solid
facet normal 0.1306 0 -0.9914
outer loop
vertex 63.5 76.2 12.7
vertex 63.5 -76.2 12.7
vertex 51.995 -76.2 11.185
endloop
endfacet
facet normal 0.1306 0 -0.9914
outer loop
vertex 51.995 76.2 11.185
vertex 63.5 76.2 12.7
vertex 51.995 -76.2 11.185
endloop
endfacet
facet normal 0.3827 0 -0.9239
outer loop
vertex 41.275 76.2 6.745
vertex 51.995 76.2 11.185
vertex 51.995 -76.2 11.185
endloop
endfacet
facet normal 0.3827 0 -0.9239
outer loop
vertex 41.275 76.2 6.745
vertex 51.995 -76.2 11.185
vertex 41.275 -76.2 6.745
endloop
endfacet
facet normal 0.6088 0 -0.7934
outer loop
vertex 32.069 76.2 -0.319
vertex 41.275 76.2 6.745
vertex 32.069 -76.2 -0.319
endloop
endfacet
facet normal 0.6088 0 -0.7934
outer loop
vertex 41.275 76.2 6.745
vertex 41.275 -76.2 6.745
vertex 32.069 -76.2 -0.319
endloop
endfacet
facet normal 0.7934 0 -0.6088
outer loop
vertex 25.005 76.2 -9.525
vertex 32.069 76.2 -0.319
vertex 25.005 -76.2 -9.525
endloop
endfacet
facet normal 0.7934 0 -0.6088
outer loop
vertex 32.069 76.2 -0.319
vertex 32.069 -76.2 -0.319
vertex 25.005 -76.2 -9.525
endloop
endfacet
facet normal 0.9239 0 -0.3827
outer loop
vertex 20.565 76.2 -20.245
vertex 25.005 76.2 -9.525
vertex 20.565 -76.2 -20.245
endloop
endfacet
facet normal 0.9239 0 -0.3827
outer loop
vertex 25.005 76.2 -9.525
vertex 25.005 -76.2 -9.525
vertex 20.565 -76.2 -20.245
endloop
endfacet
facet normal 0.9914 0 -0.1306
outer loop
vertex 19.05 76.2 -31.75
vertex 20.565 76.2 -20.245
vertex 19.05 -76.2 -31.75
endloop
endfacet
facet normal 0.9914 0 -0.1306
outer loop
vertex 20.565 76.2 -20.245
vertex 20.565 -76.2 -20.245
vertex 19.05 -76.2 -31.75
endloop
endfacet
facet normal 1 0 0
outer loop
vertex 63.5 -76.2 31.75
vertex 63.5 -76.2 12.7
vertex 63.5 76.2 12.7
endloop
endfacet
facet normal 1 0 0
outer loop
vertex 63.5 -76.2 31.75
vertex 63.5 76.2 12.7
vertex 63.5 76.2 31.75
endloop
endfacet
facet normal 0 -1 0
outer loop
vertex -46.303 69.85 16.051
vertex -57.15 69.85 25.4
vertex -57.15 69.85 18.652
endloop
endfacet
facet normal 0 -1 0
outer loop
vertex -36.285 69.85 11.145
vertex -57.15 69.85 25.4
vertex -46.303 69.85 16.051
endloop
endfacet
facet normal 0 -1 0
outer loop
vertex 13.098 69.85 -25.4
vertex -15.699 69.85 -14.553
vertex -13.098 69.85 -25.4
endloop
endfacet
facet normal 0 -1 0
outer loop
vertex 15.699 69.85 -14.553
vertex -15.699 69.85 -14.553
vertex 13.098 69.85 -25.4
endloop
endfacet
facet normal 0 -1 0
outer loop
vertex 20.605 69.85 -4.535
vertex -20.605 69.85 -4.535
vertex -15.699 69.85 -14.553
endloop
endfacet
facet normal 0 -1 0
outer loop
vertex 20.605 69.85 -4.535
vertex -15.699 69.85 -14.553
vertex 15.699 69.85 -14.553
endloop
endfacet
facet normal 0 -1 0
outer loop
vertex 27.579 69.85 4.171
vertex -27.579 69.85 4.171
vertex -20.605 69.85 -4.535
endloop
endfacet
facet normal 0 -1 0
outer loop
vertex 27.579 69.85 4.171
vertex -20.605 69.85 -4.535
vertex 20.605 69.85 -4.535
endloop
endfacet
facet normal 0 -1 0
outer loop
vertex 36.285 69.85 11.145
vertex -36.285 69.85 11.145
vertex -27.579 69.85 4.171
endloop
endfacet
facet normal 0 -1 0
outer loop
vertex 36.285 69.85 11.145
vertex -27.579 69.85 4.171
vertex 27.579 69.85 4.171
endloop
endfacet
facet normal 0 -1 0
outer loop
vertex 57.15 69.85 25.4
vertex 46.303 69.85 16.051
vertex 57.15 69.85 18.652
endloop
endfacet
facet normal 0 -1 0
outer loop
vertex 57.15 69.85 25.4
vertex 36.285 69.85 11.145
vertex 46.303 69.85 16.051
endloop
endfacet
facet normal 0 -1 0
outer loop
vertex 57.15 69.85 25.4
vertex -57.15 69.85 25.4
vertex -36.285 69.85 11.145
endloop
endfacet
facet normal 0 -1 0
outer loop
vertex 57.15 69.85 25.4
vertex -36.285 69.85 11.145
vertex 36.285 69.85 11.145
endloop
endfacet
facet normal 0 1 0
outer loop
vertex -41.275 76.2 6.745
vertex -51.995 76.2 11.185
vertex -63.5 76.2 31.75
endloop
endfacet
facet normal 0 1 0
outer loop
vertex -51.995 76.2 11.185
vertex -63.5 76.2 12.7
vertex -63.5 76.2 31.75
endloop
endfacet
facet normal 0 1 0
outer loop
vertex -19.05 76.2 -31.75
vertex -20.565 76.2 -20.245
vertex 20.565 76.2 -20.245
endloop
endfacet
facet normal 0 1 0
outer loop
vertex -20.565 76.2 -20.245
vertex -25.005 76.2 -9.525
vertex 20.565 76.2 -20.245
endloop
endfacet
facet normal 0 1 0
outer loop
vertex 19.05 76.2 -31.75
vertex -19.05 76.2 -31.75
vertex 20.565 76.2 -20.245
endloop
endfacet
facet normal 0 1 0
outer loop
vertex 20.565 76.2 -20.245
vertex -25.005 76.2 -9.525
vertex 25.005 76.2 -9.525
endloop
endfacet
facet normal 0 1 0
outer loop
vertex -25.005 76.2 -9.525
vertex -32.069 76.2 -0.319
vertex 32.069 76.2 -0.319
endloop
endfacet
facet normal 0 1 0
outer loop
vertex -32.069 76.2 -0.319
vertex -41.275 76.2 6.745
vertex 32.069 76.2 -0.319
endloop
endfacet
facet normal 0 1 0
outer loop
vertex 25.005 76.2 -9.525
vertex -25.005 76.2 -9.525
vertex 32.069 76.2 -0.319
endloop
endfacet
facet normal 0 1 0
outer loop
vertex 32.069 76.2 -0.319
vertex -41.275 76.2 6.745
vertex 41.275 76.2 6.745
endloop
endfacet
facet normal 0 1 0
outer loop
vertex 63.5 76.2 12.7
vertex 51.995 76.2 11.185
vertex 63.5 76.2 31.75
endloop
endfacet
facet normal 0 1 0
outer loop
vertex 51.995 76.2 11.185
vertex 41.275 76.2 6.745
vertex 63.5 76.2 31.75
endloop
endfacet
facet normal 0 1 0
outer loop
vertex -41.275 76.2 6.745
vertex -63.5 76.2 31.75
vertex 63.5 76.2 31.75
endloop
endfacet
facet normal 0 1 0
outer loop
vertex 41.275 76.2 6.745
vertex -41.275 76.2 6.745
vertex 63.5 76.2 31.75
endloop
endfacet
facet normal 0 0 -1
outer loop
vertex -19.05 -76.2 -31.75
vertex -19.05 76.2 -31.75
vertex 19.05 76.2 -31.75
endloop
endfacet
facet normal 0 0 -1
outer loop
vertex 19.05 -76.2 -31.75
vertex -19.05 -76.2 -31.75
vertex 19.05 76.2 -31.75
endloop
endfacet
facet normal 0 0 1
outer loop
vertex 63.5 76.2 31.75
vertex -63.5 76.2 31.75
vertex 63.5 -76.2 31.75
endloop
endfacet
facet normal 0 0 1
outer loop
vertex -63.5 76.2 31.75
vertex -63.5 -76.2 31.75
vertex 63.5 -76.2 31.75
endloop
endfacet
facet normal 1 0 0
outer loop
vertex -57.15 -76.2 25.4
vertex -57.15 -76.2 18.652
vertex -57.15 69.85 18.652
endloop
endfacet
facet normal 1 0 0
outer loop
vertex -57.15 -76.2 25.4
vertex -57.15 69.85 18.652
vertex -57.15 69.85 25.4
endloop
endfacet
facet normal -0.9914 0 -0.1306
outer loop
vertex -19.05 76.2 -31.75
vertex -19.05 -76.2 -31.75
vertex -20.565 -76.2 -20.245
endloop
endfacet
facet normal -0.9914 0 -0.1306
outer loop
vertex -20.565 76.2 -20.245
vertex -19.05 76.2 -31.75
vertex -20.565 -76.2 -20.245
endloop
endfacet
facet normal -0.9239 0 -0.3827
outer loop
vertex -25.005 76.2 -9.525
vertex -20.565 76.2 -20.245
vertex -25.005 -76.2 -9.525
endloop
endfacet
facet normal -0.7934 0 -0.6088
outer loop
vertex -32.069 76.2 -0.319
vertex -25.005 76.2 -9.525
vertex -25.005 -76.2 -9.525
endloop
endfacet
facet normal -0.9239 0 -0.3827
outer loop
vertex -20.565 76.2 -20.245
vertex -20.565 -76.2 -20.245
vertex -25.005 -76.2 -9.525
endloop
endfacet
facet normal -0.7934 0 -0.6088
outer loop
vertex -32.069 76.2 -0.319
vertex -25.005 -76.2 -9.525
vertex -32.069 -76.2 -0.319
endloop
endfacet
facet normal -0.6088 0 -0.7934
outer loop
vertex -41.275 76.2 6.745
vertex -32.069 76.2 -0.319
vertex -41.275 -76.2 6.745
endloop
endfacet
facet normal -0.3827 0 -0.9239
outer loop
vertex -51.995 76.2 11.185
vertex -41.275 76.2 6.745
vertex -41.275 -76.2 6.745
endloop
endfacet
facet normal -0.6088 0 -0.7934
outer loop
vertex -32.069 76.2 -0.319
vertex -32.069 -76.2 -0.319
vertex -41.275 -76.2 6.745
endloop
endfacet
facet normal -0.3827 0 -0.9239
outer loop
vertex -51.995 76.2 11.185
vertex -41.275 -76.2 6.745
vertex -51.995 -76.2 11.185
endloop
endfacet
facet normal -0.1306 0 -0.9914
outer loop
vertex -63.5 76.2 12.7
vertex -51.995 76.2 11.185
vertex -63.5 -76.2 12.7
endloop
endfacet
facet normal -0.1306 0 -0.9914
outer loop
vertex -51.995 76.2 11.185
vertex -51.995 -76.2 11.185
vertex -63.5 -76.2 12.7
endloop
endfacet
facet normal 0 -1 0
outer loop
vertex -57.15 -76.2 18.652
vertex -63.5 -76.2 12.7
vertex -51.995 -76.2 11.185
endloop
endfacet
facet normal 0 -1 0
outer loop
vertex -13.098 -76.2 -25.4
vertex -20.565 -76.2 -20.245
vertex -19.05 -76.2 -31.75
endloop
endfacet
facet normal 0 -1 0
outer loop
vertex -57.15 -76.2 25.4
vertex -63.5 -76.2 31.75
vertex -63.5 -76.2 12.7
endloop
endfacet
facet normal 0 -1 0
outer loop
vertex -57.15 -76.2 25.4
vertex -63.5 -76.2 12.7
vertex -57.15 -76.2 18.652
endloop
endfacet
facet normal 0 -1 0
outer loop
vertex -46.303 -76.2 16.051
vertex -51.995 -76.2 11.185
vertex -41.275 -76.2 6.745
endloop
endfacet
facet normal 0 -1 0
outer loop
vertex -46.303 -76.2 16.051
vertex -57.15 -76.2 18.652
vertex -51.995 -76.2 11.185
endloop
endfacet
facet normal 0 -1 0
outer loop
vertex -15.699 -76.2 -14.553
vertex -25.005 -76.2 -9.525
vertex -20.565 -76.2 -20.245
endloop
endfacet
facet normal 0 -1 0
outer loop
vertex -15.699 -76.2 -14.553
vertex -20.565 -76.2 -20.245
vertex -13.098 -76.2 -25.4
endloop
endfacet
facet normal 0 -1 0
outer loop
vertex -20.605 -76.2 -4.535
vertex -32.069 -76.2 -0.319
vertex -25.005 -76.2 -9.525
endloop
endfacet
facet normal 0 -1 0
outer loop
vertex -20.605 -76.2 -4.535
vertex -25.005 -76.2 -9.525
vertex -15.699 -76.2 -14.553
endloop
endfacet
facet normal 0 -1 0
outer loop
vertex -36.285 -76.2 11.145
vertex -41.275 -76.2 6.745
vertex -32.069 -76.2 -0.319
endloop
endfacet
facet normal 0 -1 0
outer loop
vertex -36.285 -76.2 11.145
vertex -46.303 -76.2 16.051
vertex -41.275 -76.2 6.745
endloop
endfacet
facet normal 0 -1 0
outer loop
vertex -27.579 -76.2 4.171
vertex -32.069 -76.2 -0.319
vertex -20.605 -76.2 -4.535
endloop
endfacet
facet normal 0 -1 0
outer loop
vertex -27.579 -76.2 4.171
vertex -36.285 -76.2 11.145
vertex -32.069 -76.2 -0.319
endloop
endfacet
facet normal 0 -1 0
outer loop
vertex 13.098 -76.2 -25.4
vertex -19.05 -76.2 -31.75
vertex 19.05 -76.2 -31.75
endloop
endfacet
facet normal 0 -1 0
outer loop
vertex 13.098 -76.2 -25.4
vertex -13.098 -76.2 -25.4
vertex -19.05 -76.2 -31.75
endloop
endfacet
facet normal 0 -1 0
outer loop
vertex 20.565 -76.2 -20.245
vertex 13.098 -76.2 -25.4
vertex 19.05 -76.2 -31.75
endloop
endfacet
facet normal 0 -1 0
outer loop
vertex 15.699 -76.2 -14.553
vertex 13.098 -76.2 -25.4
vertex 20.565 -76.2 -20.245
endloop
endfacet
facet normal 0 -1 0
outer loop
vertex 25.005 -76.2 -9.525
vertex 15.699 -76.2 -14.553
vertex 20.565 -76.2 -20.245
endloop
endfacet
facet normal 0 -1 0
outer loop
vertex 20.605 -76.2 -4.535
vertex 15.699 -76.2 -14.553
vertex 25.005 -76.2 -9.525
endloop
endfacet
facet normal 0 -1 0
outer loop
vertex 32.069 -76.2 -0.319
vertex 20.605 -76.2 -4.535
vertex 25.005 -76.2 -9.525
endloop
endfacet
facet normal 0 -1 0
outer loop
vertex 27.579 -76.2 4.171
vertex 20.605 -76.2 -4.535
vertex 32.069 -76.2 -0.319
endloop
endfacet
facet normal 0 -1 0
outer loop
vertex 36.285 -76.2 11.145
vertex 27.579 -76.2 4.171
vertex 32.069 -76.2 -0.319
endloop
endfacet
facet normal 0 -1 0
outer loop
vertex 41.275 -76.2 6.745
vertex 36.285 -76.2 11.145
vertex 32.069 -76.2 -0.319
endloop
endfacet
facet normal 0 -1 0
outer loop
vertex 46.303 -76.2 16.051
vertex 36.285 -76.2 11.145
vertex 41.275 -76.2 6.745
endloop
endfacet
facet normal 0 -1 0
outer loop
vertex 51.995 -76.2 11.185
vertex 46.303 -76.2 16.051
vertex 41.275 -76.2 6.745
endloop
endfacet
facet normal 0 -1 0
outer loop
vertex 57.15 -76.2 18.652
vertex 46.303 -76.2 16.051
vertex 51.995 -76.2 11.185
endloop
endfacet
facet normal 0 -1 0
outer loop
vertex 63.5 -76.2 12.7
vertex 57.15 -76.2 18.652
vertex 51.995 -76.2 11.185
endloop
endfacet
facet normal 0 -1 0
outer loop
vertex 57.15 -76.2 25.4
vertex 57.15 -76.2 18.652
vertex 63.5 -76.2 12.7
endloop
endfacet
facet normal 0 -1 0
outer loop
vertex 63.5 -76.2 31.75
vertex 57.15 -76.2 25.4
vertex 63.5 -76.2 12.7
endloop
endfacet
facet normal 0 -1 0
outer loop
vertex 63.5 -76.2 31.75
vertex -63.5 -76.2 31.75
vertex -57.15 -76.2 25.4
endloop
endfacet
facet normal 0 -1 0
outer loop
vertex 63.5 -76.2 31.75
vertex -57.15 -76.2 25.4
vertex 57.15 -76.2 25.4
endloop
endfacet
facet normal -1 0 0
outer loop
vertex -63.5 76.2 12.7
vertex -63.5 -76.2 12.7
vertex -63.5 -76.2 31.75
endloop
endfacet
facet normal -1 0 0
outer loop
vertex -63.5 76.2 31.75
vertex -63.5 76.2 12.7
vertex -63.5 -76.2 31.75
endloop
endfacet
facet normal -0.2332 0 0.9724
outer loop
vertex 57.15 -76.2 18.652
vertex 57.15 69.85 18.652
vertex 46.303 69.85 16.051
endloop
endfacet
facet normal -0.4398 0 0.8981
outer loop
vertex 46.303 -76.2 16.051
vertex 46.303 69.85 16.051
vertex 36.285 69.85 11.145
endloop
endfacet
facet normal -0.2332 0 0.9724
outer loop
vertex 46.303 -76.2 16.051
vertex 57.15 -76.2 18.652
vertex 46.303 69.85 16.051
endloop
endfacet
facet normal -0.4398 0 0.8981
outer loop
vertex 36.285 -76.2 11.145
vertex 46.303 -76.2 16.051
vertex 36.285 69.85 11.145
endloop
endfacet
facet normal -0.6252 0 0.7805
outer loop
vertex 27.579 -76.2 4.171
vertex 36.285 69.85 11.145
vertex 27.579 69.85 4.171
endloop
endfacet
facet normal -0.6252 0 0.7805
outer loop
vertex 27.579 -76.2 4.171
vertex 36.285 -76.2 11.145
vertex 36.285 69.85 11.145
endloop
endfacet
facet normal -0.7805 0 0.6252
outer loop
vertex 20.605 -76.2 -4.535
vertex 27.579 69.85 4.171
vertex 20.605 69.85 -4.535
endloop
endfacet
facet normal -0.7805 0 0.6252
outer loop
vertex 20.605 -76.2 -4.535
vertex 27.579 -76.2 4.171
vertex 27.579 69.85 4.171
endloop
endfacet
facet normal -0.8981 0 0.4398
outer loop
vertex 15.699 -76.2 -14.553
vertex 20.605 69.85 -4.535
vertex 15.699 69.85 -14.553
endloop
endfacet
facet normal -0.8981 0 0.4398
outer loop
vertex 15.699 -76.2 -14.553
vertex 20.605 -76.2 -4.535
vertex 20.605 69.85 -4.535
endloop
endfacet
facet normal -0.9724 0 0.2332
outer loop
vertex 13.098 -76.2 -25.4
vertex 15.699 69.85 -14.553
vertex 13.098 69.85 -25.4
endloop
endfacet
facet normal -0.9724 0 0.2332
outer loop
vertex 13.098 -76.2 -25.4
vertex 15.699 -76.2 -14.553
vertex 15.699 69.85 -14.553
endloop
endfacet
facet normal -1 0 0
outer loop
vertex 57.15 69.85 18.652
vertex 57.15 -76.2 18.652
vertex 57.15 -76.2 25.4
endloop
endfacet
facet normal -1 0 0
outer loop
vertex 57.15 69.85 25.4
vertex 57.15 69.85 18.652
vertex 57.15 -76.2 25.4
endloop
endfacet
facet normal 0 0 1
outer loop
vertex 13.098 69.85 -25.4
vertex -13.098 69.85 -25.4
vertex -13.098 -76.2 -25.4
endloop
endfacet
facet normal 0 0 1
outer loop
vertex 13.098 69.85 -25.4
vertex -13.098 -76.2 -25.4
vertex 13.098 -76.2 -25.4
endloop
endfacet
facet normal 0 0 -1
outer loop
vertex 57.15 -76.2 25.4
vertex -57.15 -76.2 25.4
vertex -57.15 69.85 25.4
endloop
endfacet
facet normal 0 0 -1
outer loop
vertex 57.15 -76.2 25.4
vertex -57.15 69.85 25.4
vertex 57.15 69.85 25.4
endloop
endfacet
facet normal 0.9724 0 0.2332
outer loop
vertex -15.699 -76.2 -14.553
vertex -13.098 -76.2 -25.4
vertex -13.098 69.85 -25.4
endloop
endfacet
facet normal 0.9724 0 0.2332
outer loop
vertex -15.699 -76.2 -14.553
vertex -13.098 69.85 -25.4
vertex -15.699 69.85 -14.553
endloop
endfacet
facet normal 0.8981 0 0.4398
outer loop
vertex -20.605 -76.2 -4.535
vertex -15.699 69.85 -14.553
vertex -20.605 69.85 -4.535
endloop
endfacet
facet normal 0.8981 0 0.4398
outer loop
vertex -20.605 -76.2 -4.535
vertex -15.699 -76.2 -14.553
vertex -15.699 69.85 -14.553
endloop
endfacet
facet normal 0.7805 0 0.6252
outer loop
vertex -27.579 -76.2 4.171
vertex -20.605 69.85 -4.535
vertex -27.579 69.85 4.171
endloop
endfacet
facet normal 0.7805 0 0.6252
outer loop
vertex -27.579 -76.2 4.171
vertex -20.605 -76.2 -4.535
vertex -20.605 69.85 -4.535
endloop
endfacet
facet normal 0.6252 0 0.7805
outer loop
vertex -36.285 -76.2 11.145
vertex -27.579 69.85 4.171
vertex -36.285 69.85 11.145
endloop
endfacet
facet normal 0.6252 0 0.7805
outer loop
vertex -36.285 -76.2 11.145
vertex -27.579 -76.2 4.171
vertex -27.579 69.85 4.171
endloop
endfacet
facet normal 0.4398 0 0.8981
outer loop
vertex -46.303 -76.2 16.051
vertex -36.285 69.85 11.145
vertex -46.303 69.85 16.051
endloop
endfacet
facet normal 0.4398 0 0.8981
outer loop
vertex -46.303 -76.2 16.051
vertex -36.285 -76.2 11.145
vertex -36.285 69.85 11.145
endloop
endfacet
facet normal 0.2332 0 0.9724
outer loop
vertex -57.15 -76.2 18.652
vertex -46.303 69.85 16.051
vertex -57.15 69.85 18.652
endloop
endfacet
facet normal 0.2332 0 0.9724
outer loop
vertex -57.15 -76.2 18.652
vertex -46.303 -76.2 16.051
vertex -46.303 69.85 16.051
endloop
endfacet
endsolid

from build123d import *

# Parameters (mm, degrees)
F0_W     = 127
F0_H     = 63.5
F1_DEPTH = 76.2
F3_DEPTH = 152.4
F4_T     = -6.35


with BuildPart() as f1:
    # F0 (on Front) → F1 (new body, symmetric)
    with BuildSketch(Plane.XZ):
        Rectangle(F0_W, F0_H)
    extrude(amount=F1_DEPTH, both=True)

    # F2 (on face) → F3 (cut, through all)
    with BuildSketch(Plane.XZ.offset(76.2)):
        with BuildLine():
            Line((63.5, -31.75), (63.5, 12.7))
            ThreePointArc((63.5, 12.7), (32.069104, -0.319104), (19.05, -31.75))
            Line((19.05, -31.75), (63.5, -31.75))
        make_face()
        with BuildLine():
            ThreePointArc((-19.05, -31.75), (-32.069104, -0.319104), (-63.5, 12.7))
            Line((-63.5, 12.7), (-63.5, -31.75))
            Line((-63.5, -31.75), (-19.05, -31.75))
        make_face()
    extrude(amount=-F3_DEPTH, mode=Mode.SUBTRACT)

    # F4
    f4_openings = [f1.faces().sort_by_distance(p)[0] for p in [
        (0, -76.2, 8.06084),
    ]]
    offset(amount=F4_T, openings=f4_openings)


solid = f1.part
